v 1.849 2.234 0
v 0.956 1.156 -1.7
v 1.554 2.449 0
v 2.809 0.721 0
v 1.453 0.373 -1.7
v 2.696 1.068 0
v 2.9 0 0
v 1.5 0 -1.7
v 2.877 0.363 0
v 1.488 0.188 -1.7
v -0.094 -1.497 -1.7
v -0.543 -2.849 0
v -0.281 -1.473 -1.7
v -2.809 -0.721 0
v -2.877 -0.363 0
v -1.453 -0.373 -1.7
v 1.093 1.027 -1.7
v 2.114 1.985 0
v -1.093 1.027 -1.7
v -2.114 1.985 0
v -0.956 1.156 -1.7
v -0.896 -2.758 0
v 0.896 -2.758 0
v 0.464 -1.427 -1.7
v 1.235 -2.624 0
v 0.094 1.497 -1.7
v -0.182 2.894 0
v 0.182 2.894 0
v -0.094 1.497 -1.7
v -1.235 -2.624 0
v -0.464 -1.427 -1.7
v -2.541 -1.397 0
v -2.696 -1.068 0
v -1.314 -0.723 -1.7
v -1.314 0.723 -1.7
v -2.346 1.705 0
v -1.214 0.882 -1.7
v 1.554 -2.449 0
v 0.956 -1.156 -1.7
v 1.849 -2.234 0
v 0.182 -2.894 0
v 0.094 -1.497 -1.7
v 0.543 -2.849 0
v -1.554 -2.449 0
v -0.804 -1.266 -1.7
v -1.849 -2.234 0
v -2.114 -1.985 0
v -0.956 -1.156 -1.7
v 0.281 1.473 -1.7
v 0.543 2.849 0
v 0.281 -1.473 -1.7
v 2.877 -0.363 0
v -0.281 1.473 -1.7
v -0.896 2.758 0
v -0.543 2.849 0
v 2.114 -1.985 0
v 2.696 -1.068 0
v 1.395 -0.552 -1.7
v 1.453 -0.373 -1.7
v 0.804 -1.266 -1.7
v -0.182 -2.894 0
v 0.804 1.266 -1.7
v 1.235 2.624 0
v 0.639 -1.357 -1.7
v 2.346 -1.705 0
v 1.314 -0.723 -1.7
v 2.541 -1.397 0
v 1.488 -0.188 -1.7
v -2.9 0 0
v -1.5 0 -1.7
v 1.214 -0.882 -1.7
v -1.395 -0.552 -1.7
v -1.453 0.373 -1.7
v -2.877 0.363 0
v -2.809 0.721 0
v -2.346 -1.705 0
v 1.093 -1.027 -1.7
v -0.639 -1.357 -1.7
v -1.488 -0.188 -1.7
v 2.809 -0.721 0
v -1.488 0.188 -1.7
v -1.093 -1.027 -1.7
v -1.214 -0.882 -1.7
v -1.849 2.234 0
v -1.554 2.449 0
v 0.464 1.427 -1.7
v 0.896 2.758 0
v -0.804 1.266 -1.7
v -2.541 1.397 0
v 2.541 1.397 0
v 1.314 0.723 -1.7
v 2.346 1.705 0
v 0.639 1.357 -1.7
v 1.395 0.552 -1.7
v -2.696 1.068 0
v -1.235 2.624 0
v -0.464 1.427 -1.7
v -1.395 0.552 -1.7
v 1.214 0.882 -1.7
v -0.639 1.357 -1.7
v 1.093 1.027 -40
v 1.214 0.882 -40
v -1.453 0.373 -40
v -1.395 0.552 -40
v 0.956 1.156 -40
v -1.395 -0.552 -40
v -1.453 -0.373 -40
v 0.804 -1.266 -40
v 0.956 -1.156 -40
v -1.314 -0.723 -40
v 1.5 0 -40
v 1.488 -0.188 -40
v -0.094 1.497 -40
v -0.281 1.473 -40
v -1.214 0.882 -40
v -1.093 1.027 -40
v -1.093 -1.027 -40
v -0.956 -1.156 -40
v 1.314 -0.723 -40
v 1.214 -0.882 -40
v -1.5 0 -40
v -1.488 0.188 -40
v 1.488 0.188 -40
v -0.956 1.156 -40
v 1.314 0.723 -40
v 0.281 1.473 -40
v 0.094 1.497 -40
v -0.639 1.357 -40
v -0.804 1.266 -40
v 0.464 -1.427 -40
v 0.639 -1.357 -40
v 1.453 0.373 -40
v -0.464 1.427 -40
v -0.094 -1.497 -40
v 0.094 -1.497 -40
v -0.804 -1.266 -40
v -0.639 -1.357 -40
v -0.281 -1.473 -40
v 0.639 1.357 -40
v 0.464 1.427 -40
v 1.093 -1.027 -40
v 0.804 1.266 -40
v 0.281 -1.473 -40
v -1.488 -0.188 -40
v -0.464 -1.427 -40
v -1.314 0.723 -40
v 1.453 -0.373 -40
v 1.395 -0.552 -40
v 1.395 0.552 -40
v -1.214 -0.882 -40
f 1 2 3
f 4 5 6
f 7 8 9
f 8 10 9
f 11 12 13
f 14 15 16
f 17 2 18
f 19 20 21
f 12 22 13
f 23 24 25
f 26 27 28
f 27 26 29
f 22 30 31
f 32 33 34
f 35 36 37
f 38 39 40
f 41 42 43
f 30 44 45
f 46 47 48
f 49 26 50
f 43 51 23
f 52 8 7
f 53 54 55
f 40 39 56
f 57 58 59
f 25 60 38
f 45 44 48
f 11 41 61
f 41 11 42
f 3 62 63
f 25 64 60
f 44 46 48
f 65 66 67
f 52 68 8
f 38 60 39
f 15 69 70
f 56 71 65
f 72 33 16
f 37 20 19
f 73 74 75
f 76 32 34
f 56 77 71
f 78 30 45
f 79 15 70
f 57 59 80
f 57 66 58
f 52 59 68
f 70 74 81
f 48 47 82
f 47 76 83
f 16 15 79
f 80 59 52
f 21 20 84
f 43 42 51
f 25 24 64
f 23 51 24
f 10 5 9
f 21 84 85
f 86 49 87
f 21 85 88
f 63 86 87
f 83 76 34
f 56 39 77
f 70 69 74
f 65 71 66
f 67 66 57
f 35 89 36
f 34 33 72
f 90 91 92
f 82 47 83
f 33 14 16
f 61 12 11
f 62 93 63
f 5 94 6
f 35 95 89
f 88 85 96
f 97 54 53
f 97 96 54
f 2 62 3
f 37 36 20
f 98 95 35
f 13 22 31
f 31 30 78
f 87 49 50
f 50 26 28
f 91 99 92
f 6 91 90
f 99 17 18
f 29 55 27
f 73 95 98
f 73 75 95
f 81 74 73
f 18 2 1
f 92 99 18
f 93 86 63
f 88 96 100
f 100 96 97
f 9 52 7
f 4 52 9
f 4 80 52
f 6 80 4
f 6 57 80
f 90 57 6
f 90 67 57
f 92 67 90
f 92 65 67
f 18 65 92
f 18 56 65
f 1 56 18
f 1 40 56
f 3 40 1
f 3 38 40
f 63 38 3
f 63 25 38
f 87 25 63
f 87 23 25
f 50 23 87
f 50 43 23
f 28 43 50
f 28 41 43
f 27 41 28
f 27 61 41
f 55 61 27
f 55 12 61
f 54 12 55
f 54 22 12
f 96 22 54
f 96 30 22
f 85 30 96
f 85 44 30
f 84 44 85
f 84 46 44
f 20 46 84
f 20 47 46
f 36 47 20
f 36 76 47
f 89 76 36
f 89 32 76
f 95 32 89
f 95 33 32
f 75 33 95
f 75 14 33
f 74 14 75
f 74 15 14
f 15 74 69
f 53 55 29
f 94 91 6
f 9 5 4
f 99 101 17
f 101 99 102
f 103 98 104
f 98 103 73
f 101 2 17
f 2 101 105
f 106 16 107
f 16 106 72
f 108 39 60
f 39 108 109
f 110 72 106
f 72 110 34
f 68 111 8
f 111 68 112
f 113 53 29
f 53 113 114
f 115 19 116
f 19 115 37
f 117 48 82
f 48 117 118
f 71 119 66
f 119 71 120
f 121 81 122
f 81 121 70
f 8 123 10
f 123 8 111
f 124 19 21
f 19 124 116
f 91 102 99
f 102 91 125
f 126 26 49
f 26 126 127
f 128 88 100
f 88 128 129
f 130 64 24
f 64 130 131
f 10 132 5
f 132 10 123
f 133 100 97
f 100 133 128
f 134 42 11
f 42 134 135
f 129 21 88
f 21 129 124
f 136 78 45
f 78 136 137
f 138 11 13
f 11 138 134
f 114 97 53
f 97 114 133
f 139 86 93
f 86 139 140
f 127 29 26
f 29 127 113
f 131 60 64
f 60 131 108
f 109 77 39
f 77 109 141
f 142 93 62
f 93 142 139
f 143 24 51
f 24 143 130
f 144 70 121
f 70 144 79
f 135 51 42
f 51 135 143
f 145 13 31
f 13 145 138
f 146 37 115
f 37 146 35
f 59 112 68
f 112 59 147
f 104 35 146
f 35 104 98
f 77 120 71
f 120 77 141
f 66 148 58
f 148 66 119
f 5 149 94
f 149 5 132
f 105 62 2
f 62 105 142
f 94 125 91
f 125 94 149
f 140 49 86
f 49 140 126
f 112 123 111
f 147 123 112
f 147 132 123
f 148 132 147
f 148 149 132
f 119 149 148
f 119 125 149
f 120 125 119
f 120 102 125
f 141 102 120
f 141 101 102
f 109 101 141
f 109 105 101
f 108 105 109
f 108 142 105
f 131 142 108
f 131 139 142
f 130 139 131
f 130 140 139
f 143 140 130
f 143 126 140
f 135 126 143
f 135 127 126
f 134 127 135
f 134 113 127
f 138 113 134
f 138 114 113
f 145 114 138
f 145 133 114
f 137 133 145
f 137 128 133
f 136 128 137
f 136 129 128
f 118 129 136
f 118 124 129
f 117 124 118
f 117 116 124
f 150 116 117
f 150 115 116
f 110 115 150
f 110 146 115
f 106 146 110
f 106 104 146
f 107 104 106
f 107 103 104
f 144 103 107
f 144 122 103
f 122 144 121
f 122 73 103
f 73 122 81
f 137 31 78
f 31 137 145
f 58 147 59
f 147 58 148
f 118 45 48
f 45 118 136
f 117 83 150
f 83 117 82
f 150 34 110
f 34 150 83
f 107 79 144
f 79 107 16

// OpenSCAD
// Generated by SolidPython 1.1.3 on 2023-03-13 21:06:12
$fn = 50;


difference() {
	union() {
		translate(v = [0, 0, -1.7000000000]) {
			rotate(a = [0, 0, 0]) {
				cylinder(h = 1.7000000000, r1 = 1.5000000000, r2 = 2.9000000000);
			}
		}
		translate(v = [0, 0, -40]) {
			rotate(a = [0, 0, 0]) {
				cylinder(h = 40, r = 1.5000000000);
			}
		}
	}
	union();
}
/***********************************************
*********      SolidPython code:      **********
************************************************
 
from solid import *
import os
import subprocess

import oomB

import opsc_library_gen

mode = "laser"
#mode = "3d_print"

defined_objects = {}

radius_dict = {}
countersunk_dict = {}


def set_mode(m):
    global mode
    mode = m
    radius_dict['M6'] = 6.5/2
    radius_dict['M3'] = 3.3/2
    if mode == "laser":
        radius_dict['M6'] = 6/2
        radius_dict['M3'] = 3/2

    countersunk_dict['M3'] = {}
    countersunk_dict['M3']['little_rad'] = radius_dict['M3']
    countersunk_dict['M3']['big_rad'] = (5.5+0.6)/2
    if mode == "laser":
        countersunk_dict['M3']['big_rad'] = (4.75+0.6)/2
        countersunk_dict['M3']['little_rad'] = (4.75+0.6)/2

    countersunk_dict['M3']['height'] = 1.7


def opsc_make_object(filename, objects, save_type="none",resolution=50, layers = 1, tilediff = 200, mode="laser", overwrite=True):
    if overwrite or not os.path.exists(filename):
        set_mode(mode)
        save_type = save_type.lower()
        os.makedirs(os.path.dirname(filename), exist_ok=True)
        final_object = opsc_get_object(objects, mode = mode)
        # Save the final object to the specified filename    
        scad_render_to_file(final_object, filename, file_header='$fn = %s;' % resolution, include_orig_code=True)
        if save_type == "all":
            saveToAll(filename)
        elif save_type == "dxf":
            saveToDxf(filename)
        if mode == "laser":
            filename_laser = filename.replace(".scad","-flat.scad")
            scad_render_to_file(getLaser(final_object, layers=layers, tilediff=tilediff), filename_laser, file_header='$fn = %s;' % resolution, include_orig_code=True)
            if save_type == "all":
                saveToAll(filename_laser)
            elif save_type == "dxf":
                saveToDxf(filename_laser)


def opsc_get_object(objects, mode = "laser"):
    # Create the solidpython objects only include the positive objects and if they don't have inclusion or their inclusion is either all or mode
    # Initialize an empty list to store the results
    positive_objects = []

    # Iterate over the "objects" list
    for obj in objects:
        # Check if the current object has a "type" key with a value of "positive"
        if obj['type'] == 'positive':
            # Check if the current object has an "inclusion" key and its value matches "mode",
            # or if the current object does not have an "inclusion" key at all
            if not 'inclusion' in obj or obj['inclusion'] == "all" or obj['inclusion'] == mode:
                # Call the "get_opsc_item" function with the current object as an argument
                opsc_item = get_opsc_item(obj)
                # Add the result to the "positive_objects" list
                positive_objects.append(opsc_item)
# Initialize an empty list to store the results
    negative_objects = []

    # Iterate over the "objects" list
    for obj in objects:
        # Check if the current object has a "type" key with a value of "negative"
        if obj['type'] == 'negative':
            # Check if the current object has an "inclusion" key and its value matches "mode",
            # or if the current object does not have an "inclusion" key at all
            if not 'inclusion' in obj or obj['inclusion'] == "all" or obj['inclusion'] == mode:
                # Call the "get_opsc_item" function with the current object as an argument
                opsc_item = get_opsc_item(obj)
                # Add the result to the "negative_objects" list
                negative_objects.append(opsc_item)
    
    #positive_objects = [get_opsc_item(obj) for obj in objects if obj['type'] == 'positive']
    #negative_objects = [get_opsc_item(obj) for obj in objects if obj['type'] == 'negative']
    # Union the positive objects
    positive_object = union()(*positive_objects)
    # Union the negative objects
    negative_object = union()(*negative_objects)
    # Create the final object by subtracting the negative objects from the positive objects
    return difference()(positive_object, negative_object)

def get_opsc_item(params):
    # A dictionary to map radius string values to numerical values
    #radius_dict = {'small': 5, 'medium': 10, 'large': 15}
    # An array of function names for basic shapes
    basic_shapes = ['cube', 'sphere', 'cylinder']
    
    # An array of function names for other shapes
    other_shapes = ['hole', 'slot', 'rounded_rectangle', 'countersunk', 'polyg']
    


    # Convert radius to r if present, and remove radius from the params dictionary
    if 'radius' in params:
        if isinstance(params['radius'], str):
            # Use the radius_dict to map the radius string value to a numerical value
            params['r'] = radius_dict[params['radius']]
        else:
            params['r'] = params['radius']
        del params['radius']
    

    # Check if the object type is a basic shape
    if params['shape'] in basic_shapes:
        # Remove shape and unexpected dictionary values
        allowed_keys = {'size', 'r', 'r1', 'r2', 'd', 'h', 'rw', 'rh', 'dw', 'dh'}
        shape_params = {k: v for k, v in params.items() if k in allowed_keys}

        #params['m'] = "#"
        ###split for adding modifier
        try:
            m = params['m']
            func = globals()[params['shape']]
            return_value = get_opsc_transform(params,func(**shape_params))
            return_value = (return_value).set_modifier(m)
            return return_value
        except KeyError as e:
            return get_opsc_transform(params,globals()[params['shape']](**shape_params))
        
    elif params['shape'] == 'polygon':
        # Remove shape and unexpected dictionary values
        h  = params['height']
        allowed_keys = {'points'}
        shape_params = {k: v for k, v in params.items() if k in allowed_keys}

        # Call the corresponding function for the shape parameter, using ** notation to pass the shape_params dictionary as keyword arguments
        params["rot"] = [0,0,0]        
        try:
            m = params['m']
            func = globals()[params['shape']]
            return_value = get_opsc_transform(params,linear_extrude(h)(globals()[params['shape']](**shape_params)))
            return_value = (return_value).set_modifier(m)
            return return_value
        except KeyError as e:
            return_value = get_opsc_transform(params,linear_extrude(h)(globals()[params['shape']](**shape_params)))
            return_value = (return_value)
            return return_value


    # If the object type is not a basic shape, check if it's a defined object or one of the other shapes
    elif params['shape'] in other_shapes:
        # Call the corresponding function for the shape parameter, passing the params dictionary as an argument
        p2 = copy.deepcopy(params)
        p2["pos"] = [0,0,0]
        return get_opsc_transform(params,globals()[params['shape']](p2))
    
    # If the object is not a basic shape or a defined object, try to import it from a .scad file
    else:
        obj = defined_objects[params['shape']]
        return get_opsc_transform(params,obj)

def get_opsc_transform(params, solid_obj):
    # Rotate the object based on the 'rot' field in the params dictionary, or the 'rotX', 'rotY', and 'rotZ' fields if 'rot' is not present
    rot = params.get('rot', [])
    if rot:
        rotX, rotY, rotZ = rot
    else:
        rotX = params.get('rotX', 0)
        rotY = params.get('rotY', 0)
        rotZ = params.get('rotZ', 0)
    solid_obj = rotate([rotX, rotY, rotZ])(solid_obj)

    # Translate the object based on the 'pos' field in the params dictionary, or the 'x', 'y', and 'z' fields if 'pos' is not present
    pos = params.get('pos', [])
    if pos:
        x, y, z = pos
    else:
        x = params.get('x', 0)
        y = params.get('y', 0)
        z = params.get('z', 0)
    solid_obj = translate([x, y, z])(solid_obj)
    return solid_obj


import random

def opsc_easy_array(type, shape, repeats, pos_start, shift_arr, **kwargs):
    for i in range(0,3):
        repeats.append(1)
        pos_start.append(0)
        shift_arr.append(0)
    return_objects = []

    for x in range(0,repeats[0]):
        for y in range(0,repeats[1]):
            for z in range(0,repeats[2]):
                return_objects.append(opsc_easy(type, shape, pos=[pos_start[0]+x*shift_arr[0],pos_start[1]+y*shift_arr[1],pos_start[2]+z*shift_arr[2]], **kwargs))
    return return_objects                



def opsc_easy(type, shape, **kwargs):
    obj = {
        'type': type,
        'shape': shape
    }
    for param in ['size', 'r', 'r1', 'r2', 'd', 'h', 'rw', 'rh', 'dw', 'dh', 'pos', 'x', 'y', 'z', 'rot', 'rotX', 'rotY', 'rotZ', "w", "inclusion", 'sides', 'height', "m"]:
        if param in kwargs:
            obj[param] = kwargs[param]
    return obj

def hole(params):
    p2 = copy.deepcopy(params)  
    # Check if the radius is a string and replace it with the corresponding value from the dictionary
    if isinstance(p2['r'], str):
        p2['r'] = radius_dict[p2['r']]
    
    # Set the height to 100 if not specified
    if 'h' not in p2:
        p2['h'] = 100
        p2["pos"] = [0,0,-50]
    p2["center"] = True
    # Create the cylinder object
    p2["shape"] = "cylinder"
    p2["type"] = "positive"

    return get_opsc_item(p2)

import copy

def countersunk(params):
    p2 = copy.deepcopy(params)
    counter_rad = p2['r']
    p2['r'] = radius_dict[p2['r']]
    hp = copy.deepcopy(p2)
    hp["type"] = "positive"
    hp["shape"] = "hole"
    del hp["rot"]
    hol = get_opsc_item(hp)
    
    cp = copy.deepcopy(p2)
    cp["h"] = countersunk_dict[counter_rad]["height"]
    cp["r2"] = countersunk_dict[counter_rad]["little_rad"]
    cp["r1"] = countersunk_dict[counter_rad]["big_rad"]
    del cp["r"]
    del cp["rot"]
    cp["type"] = "positive"
    cp["shape"] = "cylinder"
    cp["pos"] = [0,0,0]

    top = get_opsc_item(cp)
    return union()(hol,top)



def slot(params):  
    p2 = copy.deepcopy(params) 
    if isinstance(p2['r'], str):
        p2['r'] = radius_dict[p2['r']]
    p2["type"] = "positive"
    p2["shape"] = "hole"
    del p2["rot"]
    p2["pos"] = [0,0,0]
    left = copy.deepcopy(p2)
    right = copy.deepcopy(p2)
    left["pos"][0] = p2["w"] / 2 - p2["r"] 
    
    right["pos"][0] = -p2["w"] / 2 + p2["r"] 
    pass
    leftObj = get_opsc_item(left)
    rightObj = get_opsc_item(right)
    return hull()(leftObj, rightObj)

def rounded_rectangle(params):   
    p2 = copy.deepcopy(params) 
    p2["h"] = p2["size"][2]
    p2["pos"] = p2.get("pos", [0, 0, 0]) 
    p2["type"] = "positive"
    p2["shape"] = "hole"
    p2["pos"] = [0,0,0]
    
    if 'rot' in p2:
        del p2["rot"]   
    if 'r' not in p2:
        p2["r"] = 5 
    tl = copy.deepcopy(p2)
    tr = copy.deepcopy(p2)
    bl = copy.deepcopy(p2)
    br = copy.deepcopy(p2)
    tl["pos"][0] = -(p2["size"][0] - p2["r"]*2)/2
    tl["pos"][1] = (p2["size"][1] - p2["r"]*2)/2
    tr["pos"][0] = (p2["size"][0] - p2["r"]*2)/2
    tr["pos"][1] = (p2["size"][1] - p2["r"]*2)/2
    bl["pos"][0] = -(p2["size"][0] - p2["r"]*2)/2
    bl["pos"][1] = -(p2["size"][1] - p2["r"]*2)/2
    br["pos"][0] = (p2["size"][0] - p2["r"]*2)/2
    br["pos"][1] = -(p2["size"][1] - p2["r"]*2)/2
    del tl["size"]
    del tr["size"]
    del bl["size"]
    del br["size"]
    tlo = get_opsc_item(tl)
    tro = get_opsc_item(tr)
    blo = get_opsc_item(bl)
    bro = get_opsc_item(br)    
    return hull()(tlo, tro, blo, bro)



def polyg(params):
    p2 = copy.deepcopy(params) 
    p2["type"] = "positive"
    p2["shape"] = "polygon"
    p2["pos"] = [0,0,0]
    sides = p2["sides"]
    radius = p2["r"]    
    angles = [i * 360 / sides for i in range(sides)]
    points = regular_polygon(sides, radius)
    
    p2["points"] = points
    return get_opsc_item(p2)

import math

def regular_polygon(num_sides, radius):
    # Calculate the angle between each side
    angle = 2 * math.pi / num_sides

    # Calculate the points of the polygon
    points = []
    for i in range(num_sides):
        x = radius * math.cos(i * angle)
        y = radius * math.sin(i * angle)
        points.append((x, y))
    return points

def import_scad_object(filename):
    # Import the .scad file and convert it to a solidpython object
    #filename = "parts"
    obj = import_scad(filename)
    return obj.main()



import os
import solid as solidpython

# A dictionary to store the defined objects


def load_scad_objects():
    opsc_library_gen.gen_library(defined_objects)

import random

def test(num_objects):
    objects = []
    for i in range(num_objects):
        # Choose a random shape
        #shape = random.choice(['cube', 'sphere', 'cylinder', 'hole', 'slot', "rounded_rectangle"])
        shape = random.choice(["rounded_rectangle"])

        # Choose a random type
        type = random.choice(['positive', 'negative'])
        
        # Create an empty object dictionary
        obj = {'shape': shape, 'type': type}
        
        # Set shape-specific parameters
        if obj['shape'] in ['cube']:
            obj['size'] =  [random.uniform(5, 15), random.uniform(5, 15), random.uniform(5, 15)]
        if obj['shape'] in ['rounded_rectangle']:
            obj['size'] =  [random.uniform(5, 15), random.uniform(5, 15), random.uniform(5, 15)]
            obj['r'] = random.uniform(0.5, 5)
        elif obj['shape'] == 'sphere':
            obj['r'] = random.uniform(5, 15)
        elif obj['shape'] in ['cylinder', 'hole']:
            obj['r'] = random.uniform(0.5, 5)
            obj['h'] = random.uniform(5, 15)
        elif obj['shape'] == 'slot':
            obj['r'] = random.uniform(0.5, 5)
            obj['h'] = random.uniform(5, 15)
            obj['w'] = random.uniform(5, 15)
        
        # Set a random position and rotation
        obj['pos'] = [random.uniform(-20, 20), random.uniform(-20, 20), random.uniform(-20, 20)]
        obj['rot'] = [random.uniform(-180, 180), random.uniform(-180, 180), random.uniform(-180, 180)]
        
        # Add the object to the list
        objects.append(obj)
    return objects

####### old file saving
def saveToAll(fileIn):
    saveToStl(fileIn)
    saveToDxf(fileIn)
    saveToPng(fileIn)
    saveToSvg(fileIn)

def saveToDxf(fileIn, fileOut="", copy_to_laser=True):
    if fileOut == "":
        fileOut = fileIn.replace(".scad",".dxf")
    saveToFile(fileIn, fileOut)


    
def saveToPng(fileIn, fileOut="",extra="--render"):
    if fileOut == "":
        fileOut = fileIn.replace(".scad",".png")
    saveToFile(fileIn, fileOut)

def saveToStl(fileIn, fileOut=""):
    if fileOut == "":
        fileOut = fileIn.replace(".scad",".stl")
    saveToFile(fileIn, fileOut)
    
def saveToSvg(fileIn, fileOut=""):
    if fileOut == "":
        fileOut = fileIn.replace(".scad",".svg")
    saveToFile(fileIn, fileOut)

def saveToFile(fileIn, fileOut,extra=""):
    #extra = extra + " --colorscheme Tomorrow"

    launchStr = 'openscad -o "' + fileOut + '"' + extra + ' "' + fileIn + '"'
    if ".png" in fileOut:
        launchStr = launchStr + " --render"
    print("            saveToFile launch string: " + launchStr)
    subprocess.run(launchStr)
    x=0

def getLaser(final_object,start=1.5,layers=1,thickness=3,tilediff=200):
        rv= []

        for x in range(layers):
            rv.append(translate([0,x*tilediff,0])(
                    projection()(
                        intersection()(translate([-500,-500,start+x*thickness])(cube(size=[1000,1000,0.1])),
                            final_object
                        )
                    )
            )
            )
            
        return union()(rv)

set_mode("laser")
load_scad_objects() 
 
************************************************/
